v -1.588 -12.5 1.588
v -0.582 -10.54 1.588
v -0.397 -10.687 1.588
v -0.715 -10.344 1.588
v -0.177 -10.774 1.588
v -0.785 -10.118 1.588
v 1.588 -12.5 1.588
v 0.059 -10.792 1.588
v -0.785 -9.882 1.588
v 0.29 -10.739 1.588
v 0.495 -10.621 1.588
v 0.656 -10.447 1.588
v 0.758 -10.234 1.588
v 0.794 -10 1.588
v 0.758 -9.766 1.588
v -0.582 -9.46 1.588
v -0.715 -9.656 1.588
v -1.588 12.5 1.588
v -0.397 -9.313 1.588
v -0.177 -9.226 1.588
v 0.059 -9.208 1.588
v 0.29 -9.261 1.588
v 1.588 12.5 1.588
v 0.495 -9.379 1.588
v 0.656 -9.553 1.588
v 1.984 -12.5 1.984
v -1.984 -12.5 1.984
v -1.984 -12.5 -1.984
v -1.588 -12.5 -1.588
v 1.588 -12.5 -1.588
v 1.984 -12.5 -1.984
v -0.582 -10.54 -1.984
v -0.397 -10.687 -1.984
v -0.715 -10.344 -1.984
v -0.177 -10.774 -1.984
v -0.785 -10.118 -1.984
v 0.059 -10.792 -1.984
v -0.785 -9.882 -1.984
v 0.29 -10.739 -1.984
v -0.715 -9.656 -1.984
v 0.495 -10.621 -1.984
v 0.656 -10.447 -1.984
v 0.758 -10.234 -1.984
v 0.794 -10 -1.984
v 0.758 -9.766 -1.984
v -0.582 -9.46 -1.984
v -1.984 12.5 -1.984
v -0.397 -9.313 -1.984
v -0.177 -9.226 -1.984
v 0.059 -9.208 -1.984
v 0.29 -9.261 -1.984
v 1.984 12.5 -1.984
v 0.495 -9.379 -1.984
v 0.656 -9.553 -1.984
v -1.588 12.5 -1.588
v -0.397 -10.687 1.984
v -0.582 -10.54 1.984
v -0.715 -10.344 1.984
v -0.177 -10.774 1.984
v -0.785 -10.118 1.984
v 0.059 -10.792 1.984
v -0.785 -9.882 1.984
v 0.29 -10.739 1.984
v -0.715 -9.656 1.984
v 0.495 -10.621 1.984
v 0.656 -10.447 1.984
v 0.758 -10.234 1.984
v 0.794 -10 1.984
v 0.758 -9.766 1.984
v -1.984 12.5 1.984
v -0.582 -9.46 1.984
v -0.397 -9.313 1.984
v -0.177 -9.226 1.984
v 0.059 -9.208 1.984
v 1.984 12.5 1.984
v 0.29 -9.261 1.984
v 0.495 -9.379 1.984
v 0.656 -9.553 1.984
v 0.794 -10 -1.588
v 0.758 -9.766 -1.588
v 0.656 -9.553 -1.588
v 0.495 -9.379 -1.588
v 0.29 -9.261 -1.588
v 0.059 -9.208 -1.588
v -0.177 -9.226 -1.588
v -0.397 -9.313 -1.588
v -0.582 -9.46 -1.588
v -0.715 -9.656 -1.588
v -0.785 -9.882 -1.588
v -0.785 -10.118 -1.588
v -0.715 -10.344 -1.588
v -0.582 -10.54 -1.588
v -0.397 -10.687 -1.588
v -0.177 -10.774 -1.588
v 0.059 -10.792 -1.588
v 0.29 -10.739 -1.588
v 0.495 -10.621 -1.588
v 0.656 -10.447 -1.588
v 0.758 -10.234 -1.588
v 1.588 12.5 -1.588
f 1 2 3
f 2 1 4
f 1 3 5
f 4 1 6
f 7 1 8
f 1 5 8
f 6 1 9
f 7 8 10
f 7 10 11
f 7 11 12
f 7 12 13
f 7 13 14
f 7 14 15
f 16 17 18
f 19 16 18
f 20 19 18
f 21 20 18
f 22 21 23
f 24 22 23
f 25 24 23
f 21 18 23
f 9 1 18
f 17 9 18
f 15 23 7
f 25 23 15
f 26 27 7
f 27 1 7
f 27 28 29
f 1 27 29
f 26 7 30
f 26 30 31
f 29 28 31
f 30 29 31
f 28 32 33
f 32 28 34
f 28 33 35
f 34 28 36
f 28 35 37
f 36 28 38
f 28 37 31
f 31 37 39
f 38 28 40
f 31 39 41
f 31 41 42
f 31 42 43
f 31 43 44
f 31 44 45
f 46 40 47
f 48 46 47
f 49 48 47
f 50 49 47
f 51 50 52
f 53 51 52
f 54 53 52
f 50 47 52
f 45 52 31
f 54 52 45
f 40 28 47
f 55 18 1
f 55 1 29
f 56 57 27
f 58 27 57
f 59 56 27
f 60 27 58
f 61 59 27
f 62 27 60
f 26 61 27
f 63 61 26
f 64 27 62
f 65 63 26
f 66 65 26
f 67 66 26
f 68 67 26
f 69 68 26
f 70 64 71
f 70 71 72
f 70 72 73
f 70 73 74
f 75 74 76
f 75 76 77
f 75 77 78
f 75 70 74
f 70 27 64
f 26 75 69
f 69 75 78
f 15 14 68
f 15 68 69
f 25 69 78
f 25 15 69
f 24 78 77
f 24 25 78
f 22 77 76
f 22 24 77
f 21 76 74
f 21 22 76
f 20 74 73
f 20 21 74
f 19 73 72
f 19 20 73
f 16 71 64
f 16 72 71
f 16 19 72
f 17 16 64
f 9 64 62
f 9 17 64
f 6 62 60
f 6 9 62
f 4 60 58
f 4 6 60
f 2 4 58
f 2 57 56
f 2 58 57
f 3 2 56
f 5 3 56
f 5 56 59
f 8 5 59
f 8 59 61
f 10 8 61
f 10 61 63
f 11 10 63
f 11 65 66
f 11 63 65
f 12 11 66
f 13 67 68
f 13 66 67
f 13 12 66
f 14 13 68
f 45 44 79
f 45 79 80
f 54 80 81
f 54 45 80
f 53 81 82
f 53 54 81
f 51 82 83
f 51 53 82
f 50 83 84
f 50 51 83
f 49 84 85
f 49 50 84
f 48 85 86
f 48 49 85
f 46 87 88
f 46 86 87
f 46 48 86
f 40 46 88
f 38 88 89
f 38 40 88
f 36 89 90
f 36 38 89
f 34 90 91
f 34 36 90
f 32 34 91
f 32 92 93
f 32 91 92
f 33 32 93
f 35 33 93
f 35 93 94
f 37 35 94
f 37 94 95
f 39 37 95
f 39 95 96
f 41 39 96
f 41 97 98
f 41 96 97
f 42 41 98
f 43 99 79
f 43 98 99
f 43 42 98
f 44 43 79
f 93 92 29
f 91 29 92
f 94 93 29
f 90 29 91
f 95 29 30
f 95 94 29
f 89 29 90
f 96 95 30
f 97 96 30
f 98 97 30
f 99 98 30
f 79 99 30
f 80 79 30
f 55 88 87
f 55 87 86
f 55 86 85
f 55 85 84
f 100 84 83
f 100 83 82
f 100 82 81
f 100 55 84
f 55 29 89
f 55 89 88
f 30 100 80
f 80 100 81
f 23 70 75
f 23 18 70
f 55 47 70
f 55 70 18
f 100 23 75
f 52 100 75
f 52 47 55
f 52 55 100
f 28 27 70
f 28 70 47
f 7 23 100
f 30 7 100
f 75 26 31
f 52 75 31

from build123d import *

# Parameters (mm, degrees)
SKETCH1_W               = 3.96875
SKETCH1_H               = 3.96875
BOSS_EXTRUDE1_DEPTH     = 12.5
SKETCH2_W               = 3.175
SKETCH2_H               = 3.175
CUT_EXTRUDE1_DEPTH      = 26.157016681
CUT_EXTRUDE2_DEPTH      = 13.811147032
CUT_EXTRUDE2_DEPTH_BACK = 13.811147032
SKETCH3_R               = 0.79375


with BuildPart() as part:
    # Sketch1 → Boss-Extrude1 (new, symmetric)
    with BuildSketch(Plane(origin=(0, 0, 0), x_dir=(1, 0, 0), z_dir=(0, 1, 0))):
        Rectangle(SKETCH1_W, SKETCH1_H)
    extrude(amount=BOSS_EXTRUDE1_DEPTH, both=True)

    # Sketch2 → Cut-Extrude1 (cut, through all)
    with BuildSketch(Plane(origin=(0, 12.5, 0), x_dir=(1, 0, 0), z_dir=(0, 1, 0))):
        Rectangle(SKETCH2_W, SKETCH2_H)
    extrude(amount=-CUT_EXTRUDE1_DEPTH, mode=Mode.SUBTRACT)

    # Sketch3 → Cut-Extrude2 (cut, two sides: drawn at the far end of the back side and taken through both)
    with BuildSketch(Plane.XY.offset(-CUT_EXTRUDE2_DEPTH_BACK)):
        with Locations((0, -10)):
            Circle(SKETCH3_R)
    extrude(amount=CUT_EXTRUDE2_DEPTH + CUT_EXTRUDE2_DEPTH_BACK, mode=Mode.SUBTRACT)


solid = part.part
